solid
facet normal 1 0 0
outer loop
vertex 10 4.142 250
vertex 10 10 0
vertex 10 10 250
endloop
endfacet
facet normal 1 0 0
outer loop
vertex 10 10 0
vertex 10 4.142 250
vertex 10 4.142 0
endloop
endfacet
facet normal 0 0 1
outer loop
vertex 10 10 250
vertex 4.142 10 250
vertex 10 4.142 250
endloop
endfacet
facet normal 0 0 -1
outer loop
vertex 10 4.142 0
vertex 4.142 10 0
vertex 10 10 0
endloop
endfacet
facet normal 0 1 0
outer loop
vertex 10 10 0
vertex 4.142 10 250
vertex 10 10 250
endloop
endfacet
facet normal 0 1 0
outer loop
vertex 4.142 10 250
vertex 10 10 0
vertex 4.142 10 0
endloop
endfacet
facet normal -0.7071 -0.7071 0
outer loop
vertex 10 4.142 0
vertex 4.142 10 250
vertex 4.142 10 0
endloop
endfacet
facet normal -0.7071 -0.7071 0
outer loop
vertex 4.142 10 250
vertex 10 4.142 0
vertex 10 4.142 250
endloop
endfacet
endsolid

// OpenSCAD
// ============================================
// Parametric Prism with Screw and Magnet Holes
// ============================================

// --- Dimensions ---
prism_height = 250;  // mm (25cm)
prism_width = 10;    // mm (1cm) W-E
prism_length = 10;   // mm (1cm) N-S

// --- Screw Hole Parameters ---
screw_type = "M3";   // "M2" or "M3"
screw_hole_small = 2;  // mm - pilot hole diameter
screw_hole_cone = true;  // add cone section to screw hole

// Screw dimensions
m2_diameter = 2.2;
m3_diameter = 3.2;
screw_diameter = (screw_type == "M2") ? m2_diameter : m3_diameter;
screw_cone_depth = 5;  // mm

// --- Magnet Hole Parameters ---
magnet_diameter = 5;   // mm
magnet_height = 3;     // mm

// --- N-side Screw Hole Heights ---
n_screw_heights = [25, 75, 125, 175, 225];  // mm

// --- S-side Screw Hole Heights ---
s_screw_heights = [];  // mm

// --- W-side Screw Hole Heights ---
w_screw_heights = [50, 100, 150, 200];  // mm

// --- E-side Screw Hole Heights ---
e_screw_heights = [];  // mm

// --- N-side Magnet Hole Heights ---
n_magnet_heights = [35, 215];  // mm

// --- S-side Magnet Hole Heights ---
s_magnet_heights = [];  // mm

// --- E-side Magnet Hole Heights ---
e_magnet_heights = [];  // mm

// --- Offsets from center ---
screw_offset = 0;    // mm
magnet_offset = 0;   // mm

// --- Clearance for clean rendering ---
clearance = 0.01;  // mm

// ============================================
// Main Assembly
// ============================================

difference() {
    // Base prism with 45-degree cut
    prism_with_cut();
    
    // N-side screw holes
    for (h = n_screw_heights) {
        screw_hole_n(h, screw_offset);
    }
    
    // S-side screw holes
    for (h = s_screw_heights) {
        screw_hole_s(h, screw_offset);
    }
    
    // W-side screw holes
    for (h = w_screw_heights) {
        screw_hole_w(h, screw_offset);
    }
    
    // E-side screw holes
    for (h = e_screw_heights) {
        screw_hole_e(h, screw_offset);
    }
    
    // N-side magnet holes
    for (h = n_magnet_heights) {
        magnet_hole_n(h, magnet_offset);
    }
    
    // S-side magnet holes
    for (h = s_magnet_heights) {
        magnet_hole_s(h, magnet_offset);
    }
    
    // E-side magnet holes
    for (h = e_magnet_heights) {
        magnet_hole_e(h, magnet_offset);
    }
}

// ============================================
// Modules
// ============================================

module prism_with_cut() {
    difference() {
        // Base prism
        cube([prism_length, prism_width, prism_height]);
        
        // 45-degree cut in NW corner on XY axis
        // Cut plane is at 45 degrees in XY, extending through entire height
        // NW corner is at (0, 0), we cut diagonally towards SE
        translate([0, 0, 0])
            rotate([0, 0, 45])
            translate([-prism_length, -prism_width, 0])
            cube([prism_length * 2, prism_width * 2, prism_height + clearance]);
    }
}

module screw_hole_n(height, offset) {
    // N-side hole: enters from N (length = 0) going towards S
    // Centered in W-E direction with offset
    y_pos = prism_width / 2 + offset;
    
    translate([0, y_pos, height])
        rotate([0, -90, 0])
        screw_hole_profile();
}

module screw_hole_w(height, offset) {
    // W-side hole: enters from W (width = 0) going towards E
    // Centered in N-S direction with offset
    x_pos = prism_length / 2 + offset;
    
    translate([x_pos, 0, height])
        rotate([0, -90, 90])
        screw_hole_profile();
}

module screw_hole_e(height, offset) {
    // E-side hole: enters from E (width = prism_width) going towards W
    // Centered in N-S direction with offset
    x_pos = prism_length / 2 + offset;
    
    translate([x_pos, prism_width, height])
        rotate([0, 90, 90])
        screw_hole_profile();
}

module screw_hole_s(height, offset) {
    // S-side hole: enters from S (length = prism_length) going towards N
    // Centered in W-E direction with offset
    y_pos = prism_width / 2 + offset;
    
    translate([prism_length, y_pos, height])
        rotate([0, 90, 0])
        screw_hole_profile();
}

module screw_hole_profile() {
    // Small pilot hole through entire width/length
    cylinder(h=prism_width + prism_length + clearance, d=screw_hole_small + clearance, $fn=32);
    
    // Wider screw shaft section
    shaft_length = (prism_width + prism_length) / 2;
    translate([0, 0, shaft_length - screw_cone_depth])
        cylinder(h=screw_cone_depth + clearance, d1=screw_diameter + clearance, d2=screw_hole_small + clearance, $fn=32);
    
    if (screw_hole_cone) {
        // Cone section for screw head
        translate([0, 0, shaft_length - screw_cone_depth - 5])
            cylinder(h=5 + clearance, d1=screw_diameter * 1.5 + clearance, d2=screw_diameter + clearance, $fn=32);
    }
}

module magnet_hole_n(height, offset) {
    // N-side magnet hole: enters from N going towards S
    // Centered in W-E direction with offset
    y_pos = prism_width / 2 + offset;
    
    translate([0, y_pos, height])
        rotate([0, -90, 0])
        cylinder(h=magnet_height + clearance, d=magnet_diameter + clearance, $fn=32);
}

module magnet_hole_s(height, offset) {
    // S-side magnet hole: enters from S going towards N
    // Centered in W-E direction with offset
    y_pos = prism_width / 2 + offset;
    
    translate([prism_length, y_pos, height])
        rotate([0, 90, 0])
        cylinder(h=magnet_height + clearance, d=magnet_diameter + clearance, $fn=32);
}

module magnet_hole_e(height, offset) {
    // E-side magnet hole: enters from E going towards W
    // Centered in N-S direction with offset
    x_pos = prism_length / 2 + offset;
    
    translate([x_pos, prism_width, height])
        rotate([0, 90, 90])
        cylinder(h=magnet_height + clearance, d=magnet_diameter + clearance, $fn=32);
}
